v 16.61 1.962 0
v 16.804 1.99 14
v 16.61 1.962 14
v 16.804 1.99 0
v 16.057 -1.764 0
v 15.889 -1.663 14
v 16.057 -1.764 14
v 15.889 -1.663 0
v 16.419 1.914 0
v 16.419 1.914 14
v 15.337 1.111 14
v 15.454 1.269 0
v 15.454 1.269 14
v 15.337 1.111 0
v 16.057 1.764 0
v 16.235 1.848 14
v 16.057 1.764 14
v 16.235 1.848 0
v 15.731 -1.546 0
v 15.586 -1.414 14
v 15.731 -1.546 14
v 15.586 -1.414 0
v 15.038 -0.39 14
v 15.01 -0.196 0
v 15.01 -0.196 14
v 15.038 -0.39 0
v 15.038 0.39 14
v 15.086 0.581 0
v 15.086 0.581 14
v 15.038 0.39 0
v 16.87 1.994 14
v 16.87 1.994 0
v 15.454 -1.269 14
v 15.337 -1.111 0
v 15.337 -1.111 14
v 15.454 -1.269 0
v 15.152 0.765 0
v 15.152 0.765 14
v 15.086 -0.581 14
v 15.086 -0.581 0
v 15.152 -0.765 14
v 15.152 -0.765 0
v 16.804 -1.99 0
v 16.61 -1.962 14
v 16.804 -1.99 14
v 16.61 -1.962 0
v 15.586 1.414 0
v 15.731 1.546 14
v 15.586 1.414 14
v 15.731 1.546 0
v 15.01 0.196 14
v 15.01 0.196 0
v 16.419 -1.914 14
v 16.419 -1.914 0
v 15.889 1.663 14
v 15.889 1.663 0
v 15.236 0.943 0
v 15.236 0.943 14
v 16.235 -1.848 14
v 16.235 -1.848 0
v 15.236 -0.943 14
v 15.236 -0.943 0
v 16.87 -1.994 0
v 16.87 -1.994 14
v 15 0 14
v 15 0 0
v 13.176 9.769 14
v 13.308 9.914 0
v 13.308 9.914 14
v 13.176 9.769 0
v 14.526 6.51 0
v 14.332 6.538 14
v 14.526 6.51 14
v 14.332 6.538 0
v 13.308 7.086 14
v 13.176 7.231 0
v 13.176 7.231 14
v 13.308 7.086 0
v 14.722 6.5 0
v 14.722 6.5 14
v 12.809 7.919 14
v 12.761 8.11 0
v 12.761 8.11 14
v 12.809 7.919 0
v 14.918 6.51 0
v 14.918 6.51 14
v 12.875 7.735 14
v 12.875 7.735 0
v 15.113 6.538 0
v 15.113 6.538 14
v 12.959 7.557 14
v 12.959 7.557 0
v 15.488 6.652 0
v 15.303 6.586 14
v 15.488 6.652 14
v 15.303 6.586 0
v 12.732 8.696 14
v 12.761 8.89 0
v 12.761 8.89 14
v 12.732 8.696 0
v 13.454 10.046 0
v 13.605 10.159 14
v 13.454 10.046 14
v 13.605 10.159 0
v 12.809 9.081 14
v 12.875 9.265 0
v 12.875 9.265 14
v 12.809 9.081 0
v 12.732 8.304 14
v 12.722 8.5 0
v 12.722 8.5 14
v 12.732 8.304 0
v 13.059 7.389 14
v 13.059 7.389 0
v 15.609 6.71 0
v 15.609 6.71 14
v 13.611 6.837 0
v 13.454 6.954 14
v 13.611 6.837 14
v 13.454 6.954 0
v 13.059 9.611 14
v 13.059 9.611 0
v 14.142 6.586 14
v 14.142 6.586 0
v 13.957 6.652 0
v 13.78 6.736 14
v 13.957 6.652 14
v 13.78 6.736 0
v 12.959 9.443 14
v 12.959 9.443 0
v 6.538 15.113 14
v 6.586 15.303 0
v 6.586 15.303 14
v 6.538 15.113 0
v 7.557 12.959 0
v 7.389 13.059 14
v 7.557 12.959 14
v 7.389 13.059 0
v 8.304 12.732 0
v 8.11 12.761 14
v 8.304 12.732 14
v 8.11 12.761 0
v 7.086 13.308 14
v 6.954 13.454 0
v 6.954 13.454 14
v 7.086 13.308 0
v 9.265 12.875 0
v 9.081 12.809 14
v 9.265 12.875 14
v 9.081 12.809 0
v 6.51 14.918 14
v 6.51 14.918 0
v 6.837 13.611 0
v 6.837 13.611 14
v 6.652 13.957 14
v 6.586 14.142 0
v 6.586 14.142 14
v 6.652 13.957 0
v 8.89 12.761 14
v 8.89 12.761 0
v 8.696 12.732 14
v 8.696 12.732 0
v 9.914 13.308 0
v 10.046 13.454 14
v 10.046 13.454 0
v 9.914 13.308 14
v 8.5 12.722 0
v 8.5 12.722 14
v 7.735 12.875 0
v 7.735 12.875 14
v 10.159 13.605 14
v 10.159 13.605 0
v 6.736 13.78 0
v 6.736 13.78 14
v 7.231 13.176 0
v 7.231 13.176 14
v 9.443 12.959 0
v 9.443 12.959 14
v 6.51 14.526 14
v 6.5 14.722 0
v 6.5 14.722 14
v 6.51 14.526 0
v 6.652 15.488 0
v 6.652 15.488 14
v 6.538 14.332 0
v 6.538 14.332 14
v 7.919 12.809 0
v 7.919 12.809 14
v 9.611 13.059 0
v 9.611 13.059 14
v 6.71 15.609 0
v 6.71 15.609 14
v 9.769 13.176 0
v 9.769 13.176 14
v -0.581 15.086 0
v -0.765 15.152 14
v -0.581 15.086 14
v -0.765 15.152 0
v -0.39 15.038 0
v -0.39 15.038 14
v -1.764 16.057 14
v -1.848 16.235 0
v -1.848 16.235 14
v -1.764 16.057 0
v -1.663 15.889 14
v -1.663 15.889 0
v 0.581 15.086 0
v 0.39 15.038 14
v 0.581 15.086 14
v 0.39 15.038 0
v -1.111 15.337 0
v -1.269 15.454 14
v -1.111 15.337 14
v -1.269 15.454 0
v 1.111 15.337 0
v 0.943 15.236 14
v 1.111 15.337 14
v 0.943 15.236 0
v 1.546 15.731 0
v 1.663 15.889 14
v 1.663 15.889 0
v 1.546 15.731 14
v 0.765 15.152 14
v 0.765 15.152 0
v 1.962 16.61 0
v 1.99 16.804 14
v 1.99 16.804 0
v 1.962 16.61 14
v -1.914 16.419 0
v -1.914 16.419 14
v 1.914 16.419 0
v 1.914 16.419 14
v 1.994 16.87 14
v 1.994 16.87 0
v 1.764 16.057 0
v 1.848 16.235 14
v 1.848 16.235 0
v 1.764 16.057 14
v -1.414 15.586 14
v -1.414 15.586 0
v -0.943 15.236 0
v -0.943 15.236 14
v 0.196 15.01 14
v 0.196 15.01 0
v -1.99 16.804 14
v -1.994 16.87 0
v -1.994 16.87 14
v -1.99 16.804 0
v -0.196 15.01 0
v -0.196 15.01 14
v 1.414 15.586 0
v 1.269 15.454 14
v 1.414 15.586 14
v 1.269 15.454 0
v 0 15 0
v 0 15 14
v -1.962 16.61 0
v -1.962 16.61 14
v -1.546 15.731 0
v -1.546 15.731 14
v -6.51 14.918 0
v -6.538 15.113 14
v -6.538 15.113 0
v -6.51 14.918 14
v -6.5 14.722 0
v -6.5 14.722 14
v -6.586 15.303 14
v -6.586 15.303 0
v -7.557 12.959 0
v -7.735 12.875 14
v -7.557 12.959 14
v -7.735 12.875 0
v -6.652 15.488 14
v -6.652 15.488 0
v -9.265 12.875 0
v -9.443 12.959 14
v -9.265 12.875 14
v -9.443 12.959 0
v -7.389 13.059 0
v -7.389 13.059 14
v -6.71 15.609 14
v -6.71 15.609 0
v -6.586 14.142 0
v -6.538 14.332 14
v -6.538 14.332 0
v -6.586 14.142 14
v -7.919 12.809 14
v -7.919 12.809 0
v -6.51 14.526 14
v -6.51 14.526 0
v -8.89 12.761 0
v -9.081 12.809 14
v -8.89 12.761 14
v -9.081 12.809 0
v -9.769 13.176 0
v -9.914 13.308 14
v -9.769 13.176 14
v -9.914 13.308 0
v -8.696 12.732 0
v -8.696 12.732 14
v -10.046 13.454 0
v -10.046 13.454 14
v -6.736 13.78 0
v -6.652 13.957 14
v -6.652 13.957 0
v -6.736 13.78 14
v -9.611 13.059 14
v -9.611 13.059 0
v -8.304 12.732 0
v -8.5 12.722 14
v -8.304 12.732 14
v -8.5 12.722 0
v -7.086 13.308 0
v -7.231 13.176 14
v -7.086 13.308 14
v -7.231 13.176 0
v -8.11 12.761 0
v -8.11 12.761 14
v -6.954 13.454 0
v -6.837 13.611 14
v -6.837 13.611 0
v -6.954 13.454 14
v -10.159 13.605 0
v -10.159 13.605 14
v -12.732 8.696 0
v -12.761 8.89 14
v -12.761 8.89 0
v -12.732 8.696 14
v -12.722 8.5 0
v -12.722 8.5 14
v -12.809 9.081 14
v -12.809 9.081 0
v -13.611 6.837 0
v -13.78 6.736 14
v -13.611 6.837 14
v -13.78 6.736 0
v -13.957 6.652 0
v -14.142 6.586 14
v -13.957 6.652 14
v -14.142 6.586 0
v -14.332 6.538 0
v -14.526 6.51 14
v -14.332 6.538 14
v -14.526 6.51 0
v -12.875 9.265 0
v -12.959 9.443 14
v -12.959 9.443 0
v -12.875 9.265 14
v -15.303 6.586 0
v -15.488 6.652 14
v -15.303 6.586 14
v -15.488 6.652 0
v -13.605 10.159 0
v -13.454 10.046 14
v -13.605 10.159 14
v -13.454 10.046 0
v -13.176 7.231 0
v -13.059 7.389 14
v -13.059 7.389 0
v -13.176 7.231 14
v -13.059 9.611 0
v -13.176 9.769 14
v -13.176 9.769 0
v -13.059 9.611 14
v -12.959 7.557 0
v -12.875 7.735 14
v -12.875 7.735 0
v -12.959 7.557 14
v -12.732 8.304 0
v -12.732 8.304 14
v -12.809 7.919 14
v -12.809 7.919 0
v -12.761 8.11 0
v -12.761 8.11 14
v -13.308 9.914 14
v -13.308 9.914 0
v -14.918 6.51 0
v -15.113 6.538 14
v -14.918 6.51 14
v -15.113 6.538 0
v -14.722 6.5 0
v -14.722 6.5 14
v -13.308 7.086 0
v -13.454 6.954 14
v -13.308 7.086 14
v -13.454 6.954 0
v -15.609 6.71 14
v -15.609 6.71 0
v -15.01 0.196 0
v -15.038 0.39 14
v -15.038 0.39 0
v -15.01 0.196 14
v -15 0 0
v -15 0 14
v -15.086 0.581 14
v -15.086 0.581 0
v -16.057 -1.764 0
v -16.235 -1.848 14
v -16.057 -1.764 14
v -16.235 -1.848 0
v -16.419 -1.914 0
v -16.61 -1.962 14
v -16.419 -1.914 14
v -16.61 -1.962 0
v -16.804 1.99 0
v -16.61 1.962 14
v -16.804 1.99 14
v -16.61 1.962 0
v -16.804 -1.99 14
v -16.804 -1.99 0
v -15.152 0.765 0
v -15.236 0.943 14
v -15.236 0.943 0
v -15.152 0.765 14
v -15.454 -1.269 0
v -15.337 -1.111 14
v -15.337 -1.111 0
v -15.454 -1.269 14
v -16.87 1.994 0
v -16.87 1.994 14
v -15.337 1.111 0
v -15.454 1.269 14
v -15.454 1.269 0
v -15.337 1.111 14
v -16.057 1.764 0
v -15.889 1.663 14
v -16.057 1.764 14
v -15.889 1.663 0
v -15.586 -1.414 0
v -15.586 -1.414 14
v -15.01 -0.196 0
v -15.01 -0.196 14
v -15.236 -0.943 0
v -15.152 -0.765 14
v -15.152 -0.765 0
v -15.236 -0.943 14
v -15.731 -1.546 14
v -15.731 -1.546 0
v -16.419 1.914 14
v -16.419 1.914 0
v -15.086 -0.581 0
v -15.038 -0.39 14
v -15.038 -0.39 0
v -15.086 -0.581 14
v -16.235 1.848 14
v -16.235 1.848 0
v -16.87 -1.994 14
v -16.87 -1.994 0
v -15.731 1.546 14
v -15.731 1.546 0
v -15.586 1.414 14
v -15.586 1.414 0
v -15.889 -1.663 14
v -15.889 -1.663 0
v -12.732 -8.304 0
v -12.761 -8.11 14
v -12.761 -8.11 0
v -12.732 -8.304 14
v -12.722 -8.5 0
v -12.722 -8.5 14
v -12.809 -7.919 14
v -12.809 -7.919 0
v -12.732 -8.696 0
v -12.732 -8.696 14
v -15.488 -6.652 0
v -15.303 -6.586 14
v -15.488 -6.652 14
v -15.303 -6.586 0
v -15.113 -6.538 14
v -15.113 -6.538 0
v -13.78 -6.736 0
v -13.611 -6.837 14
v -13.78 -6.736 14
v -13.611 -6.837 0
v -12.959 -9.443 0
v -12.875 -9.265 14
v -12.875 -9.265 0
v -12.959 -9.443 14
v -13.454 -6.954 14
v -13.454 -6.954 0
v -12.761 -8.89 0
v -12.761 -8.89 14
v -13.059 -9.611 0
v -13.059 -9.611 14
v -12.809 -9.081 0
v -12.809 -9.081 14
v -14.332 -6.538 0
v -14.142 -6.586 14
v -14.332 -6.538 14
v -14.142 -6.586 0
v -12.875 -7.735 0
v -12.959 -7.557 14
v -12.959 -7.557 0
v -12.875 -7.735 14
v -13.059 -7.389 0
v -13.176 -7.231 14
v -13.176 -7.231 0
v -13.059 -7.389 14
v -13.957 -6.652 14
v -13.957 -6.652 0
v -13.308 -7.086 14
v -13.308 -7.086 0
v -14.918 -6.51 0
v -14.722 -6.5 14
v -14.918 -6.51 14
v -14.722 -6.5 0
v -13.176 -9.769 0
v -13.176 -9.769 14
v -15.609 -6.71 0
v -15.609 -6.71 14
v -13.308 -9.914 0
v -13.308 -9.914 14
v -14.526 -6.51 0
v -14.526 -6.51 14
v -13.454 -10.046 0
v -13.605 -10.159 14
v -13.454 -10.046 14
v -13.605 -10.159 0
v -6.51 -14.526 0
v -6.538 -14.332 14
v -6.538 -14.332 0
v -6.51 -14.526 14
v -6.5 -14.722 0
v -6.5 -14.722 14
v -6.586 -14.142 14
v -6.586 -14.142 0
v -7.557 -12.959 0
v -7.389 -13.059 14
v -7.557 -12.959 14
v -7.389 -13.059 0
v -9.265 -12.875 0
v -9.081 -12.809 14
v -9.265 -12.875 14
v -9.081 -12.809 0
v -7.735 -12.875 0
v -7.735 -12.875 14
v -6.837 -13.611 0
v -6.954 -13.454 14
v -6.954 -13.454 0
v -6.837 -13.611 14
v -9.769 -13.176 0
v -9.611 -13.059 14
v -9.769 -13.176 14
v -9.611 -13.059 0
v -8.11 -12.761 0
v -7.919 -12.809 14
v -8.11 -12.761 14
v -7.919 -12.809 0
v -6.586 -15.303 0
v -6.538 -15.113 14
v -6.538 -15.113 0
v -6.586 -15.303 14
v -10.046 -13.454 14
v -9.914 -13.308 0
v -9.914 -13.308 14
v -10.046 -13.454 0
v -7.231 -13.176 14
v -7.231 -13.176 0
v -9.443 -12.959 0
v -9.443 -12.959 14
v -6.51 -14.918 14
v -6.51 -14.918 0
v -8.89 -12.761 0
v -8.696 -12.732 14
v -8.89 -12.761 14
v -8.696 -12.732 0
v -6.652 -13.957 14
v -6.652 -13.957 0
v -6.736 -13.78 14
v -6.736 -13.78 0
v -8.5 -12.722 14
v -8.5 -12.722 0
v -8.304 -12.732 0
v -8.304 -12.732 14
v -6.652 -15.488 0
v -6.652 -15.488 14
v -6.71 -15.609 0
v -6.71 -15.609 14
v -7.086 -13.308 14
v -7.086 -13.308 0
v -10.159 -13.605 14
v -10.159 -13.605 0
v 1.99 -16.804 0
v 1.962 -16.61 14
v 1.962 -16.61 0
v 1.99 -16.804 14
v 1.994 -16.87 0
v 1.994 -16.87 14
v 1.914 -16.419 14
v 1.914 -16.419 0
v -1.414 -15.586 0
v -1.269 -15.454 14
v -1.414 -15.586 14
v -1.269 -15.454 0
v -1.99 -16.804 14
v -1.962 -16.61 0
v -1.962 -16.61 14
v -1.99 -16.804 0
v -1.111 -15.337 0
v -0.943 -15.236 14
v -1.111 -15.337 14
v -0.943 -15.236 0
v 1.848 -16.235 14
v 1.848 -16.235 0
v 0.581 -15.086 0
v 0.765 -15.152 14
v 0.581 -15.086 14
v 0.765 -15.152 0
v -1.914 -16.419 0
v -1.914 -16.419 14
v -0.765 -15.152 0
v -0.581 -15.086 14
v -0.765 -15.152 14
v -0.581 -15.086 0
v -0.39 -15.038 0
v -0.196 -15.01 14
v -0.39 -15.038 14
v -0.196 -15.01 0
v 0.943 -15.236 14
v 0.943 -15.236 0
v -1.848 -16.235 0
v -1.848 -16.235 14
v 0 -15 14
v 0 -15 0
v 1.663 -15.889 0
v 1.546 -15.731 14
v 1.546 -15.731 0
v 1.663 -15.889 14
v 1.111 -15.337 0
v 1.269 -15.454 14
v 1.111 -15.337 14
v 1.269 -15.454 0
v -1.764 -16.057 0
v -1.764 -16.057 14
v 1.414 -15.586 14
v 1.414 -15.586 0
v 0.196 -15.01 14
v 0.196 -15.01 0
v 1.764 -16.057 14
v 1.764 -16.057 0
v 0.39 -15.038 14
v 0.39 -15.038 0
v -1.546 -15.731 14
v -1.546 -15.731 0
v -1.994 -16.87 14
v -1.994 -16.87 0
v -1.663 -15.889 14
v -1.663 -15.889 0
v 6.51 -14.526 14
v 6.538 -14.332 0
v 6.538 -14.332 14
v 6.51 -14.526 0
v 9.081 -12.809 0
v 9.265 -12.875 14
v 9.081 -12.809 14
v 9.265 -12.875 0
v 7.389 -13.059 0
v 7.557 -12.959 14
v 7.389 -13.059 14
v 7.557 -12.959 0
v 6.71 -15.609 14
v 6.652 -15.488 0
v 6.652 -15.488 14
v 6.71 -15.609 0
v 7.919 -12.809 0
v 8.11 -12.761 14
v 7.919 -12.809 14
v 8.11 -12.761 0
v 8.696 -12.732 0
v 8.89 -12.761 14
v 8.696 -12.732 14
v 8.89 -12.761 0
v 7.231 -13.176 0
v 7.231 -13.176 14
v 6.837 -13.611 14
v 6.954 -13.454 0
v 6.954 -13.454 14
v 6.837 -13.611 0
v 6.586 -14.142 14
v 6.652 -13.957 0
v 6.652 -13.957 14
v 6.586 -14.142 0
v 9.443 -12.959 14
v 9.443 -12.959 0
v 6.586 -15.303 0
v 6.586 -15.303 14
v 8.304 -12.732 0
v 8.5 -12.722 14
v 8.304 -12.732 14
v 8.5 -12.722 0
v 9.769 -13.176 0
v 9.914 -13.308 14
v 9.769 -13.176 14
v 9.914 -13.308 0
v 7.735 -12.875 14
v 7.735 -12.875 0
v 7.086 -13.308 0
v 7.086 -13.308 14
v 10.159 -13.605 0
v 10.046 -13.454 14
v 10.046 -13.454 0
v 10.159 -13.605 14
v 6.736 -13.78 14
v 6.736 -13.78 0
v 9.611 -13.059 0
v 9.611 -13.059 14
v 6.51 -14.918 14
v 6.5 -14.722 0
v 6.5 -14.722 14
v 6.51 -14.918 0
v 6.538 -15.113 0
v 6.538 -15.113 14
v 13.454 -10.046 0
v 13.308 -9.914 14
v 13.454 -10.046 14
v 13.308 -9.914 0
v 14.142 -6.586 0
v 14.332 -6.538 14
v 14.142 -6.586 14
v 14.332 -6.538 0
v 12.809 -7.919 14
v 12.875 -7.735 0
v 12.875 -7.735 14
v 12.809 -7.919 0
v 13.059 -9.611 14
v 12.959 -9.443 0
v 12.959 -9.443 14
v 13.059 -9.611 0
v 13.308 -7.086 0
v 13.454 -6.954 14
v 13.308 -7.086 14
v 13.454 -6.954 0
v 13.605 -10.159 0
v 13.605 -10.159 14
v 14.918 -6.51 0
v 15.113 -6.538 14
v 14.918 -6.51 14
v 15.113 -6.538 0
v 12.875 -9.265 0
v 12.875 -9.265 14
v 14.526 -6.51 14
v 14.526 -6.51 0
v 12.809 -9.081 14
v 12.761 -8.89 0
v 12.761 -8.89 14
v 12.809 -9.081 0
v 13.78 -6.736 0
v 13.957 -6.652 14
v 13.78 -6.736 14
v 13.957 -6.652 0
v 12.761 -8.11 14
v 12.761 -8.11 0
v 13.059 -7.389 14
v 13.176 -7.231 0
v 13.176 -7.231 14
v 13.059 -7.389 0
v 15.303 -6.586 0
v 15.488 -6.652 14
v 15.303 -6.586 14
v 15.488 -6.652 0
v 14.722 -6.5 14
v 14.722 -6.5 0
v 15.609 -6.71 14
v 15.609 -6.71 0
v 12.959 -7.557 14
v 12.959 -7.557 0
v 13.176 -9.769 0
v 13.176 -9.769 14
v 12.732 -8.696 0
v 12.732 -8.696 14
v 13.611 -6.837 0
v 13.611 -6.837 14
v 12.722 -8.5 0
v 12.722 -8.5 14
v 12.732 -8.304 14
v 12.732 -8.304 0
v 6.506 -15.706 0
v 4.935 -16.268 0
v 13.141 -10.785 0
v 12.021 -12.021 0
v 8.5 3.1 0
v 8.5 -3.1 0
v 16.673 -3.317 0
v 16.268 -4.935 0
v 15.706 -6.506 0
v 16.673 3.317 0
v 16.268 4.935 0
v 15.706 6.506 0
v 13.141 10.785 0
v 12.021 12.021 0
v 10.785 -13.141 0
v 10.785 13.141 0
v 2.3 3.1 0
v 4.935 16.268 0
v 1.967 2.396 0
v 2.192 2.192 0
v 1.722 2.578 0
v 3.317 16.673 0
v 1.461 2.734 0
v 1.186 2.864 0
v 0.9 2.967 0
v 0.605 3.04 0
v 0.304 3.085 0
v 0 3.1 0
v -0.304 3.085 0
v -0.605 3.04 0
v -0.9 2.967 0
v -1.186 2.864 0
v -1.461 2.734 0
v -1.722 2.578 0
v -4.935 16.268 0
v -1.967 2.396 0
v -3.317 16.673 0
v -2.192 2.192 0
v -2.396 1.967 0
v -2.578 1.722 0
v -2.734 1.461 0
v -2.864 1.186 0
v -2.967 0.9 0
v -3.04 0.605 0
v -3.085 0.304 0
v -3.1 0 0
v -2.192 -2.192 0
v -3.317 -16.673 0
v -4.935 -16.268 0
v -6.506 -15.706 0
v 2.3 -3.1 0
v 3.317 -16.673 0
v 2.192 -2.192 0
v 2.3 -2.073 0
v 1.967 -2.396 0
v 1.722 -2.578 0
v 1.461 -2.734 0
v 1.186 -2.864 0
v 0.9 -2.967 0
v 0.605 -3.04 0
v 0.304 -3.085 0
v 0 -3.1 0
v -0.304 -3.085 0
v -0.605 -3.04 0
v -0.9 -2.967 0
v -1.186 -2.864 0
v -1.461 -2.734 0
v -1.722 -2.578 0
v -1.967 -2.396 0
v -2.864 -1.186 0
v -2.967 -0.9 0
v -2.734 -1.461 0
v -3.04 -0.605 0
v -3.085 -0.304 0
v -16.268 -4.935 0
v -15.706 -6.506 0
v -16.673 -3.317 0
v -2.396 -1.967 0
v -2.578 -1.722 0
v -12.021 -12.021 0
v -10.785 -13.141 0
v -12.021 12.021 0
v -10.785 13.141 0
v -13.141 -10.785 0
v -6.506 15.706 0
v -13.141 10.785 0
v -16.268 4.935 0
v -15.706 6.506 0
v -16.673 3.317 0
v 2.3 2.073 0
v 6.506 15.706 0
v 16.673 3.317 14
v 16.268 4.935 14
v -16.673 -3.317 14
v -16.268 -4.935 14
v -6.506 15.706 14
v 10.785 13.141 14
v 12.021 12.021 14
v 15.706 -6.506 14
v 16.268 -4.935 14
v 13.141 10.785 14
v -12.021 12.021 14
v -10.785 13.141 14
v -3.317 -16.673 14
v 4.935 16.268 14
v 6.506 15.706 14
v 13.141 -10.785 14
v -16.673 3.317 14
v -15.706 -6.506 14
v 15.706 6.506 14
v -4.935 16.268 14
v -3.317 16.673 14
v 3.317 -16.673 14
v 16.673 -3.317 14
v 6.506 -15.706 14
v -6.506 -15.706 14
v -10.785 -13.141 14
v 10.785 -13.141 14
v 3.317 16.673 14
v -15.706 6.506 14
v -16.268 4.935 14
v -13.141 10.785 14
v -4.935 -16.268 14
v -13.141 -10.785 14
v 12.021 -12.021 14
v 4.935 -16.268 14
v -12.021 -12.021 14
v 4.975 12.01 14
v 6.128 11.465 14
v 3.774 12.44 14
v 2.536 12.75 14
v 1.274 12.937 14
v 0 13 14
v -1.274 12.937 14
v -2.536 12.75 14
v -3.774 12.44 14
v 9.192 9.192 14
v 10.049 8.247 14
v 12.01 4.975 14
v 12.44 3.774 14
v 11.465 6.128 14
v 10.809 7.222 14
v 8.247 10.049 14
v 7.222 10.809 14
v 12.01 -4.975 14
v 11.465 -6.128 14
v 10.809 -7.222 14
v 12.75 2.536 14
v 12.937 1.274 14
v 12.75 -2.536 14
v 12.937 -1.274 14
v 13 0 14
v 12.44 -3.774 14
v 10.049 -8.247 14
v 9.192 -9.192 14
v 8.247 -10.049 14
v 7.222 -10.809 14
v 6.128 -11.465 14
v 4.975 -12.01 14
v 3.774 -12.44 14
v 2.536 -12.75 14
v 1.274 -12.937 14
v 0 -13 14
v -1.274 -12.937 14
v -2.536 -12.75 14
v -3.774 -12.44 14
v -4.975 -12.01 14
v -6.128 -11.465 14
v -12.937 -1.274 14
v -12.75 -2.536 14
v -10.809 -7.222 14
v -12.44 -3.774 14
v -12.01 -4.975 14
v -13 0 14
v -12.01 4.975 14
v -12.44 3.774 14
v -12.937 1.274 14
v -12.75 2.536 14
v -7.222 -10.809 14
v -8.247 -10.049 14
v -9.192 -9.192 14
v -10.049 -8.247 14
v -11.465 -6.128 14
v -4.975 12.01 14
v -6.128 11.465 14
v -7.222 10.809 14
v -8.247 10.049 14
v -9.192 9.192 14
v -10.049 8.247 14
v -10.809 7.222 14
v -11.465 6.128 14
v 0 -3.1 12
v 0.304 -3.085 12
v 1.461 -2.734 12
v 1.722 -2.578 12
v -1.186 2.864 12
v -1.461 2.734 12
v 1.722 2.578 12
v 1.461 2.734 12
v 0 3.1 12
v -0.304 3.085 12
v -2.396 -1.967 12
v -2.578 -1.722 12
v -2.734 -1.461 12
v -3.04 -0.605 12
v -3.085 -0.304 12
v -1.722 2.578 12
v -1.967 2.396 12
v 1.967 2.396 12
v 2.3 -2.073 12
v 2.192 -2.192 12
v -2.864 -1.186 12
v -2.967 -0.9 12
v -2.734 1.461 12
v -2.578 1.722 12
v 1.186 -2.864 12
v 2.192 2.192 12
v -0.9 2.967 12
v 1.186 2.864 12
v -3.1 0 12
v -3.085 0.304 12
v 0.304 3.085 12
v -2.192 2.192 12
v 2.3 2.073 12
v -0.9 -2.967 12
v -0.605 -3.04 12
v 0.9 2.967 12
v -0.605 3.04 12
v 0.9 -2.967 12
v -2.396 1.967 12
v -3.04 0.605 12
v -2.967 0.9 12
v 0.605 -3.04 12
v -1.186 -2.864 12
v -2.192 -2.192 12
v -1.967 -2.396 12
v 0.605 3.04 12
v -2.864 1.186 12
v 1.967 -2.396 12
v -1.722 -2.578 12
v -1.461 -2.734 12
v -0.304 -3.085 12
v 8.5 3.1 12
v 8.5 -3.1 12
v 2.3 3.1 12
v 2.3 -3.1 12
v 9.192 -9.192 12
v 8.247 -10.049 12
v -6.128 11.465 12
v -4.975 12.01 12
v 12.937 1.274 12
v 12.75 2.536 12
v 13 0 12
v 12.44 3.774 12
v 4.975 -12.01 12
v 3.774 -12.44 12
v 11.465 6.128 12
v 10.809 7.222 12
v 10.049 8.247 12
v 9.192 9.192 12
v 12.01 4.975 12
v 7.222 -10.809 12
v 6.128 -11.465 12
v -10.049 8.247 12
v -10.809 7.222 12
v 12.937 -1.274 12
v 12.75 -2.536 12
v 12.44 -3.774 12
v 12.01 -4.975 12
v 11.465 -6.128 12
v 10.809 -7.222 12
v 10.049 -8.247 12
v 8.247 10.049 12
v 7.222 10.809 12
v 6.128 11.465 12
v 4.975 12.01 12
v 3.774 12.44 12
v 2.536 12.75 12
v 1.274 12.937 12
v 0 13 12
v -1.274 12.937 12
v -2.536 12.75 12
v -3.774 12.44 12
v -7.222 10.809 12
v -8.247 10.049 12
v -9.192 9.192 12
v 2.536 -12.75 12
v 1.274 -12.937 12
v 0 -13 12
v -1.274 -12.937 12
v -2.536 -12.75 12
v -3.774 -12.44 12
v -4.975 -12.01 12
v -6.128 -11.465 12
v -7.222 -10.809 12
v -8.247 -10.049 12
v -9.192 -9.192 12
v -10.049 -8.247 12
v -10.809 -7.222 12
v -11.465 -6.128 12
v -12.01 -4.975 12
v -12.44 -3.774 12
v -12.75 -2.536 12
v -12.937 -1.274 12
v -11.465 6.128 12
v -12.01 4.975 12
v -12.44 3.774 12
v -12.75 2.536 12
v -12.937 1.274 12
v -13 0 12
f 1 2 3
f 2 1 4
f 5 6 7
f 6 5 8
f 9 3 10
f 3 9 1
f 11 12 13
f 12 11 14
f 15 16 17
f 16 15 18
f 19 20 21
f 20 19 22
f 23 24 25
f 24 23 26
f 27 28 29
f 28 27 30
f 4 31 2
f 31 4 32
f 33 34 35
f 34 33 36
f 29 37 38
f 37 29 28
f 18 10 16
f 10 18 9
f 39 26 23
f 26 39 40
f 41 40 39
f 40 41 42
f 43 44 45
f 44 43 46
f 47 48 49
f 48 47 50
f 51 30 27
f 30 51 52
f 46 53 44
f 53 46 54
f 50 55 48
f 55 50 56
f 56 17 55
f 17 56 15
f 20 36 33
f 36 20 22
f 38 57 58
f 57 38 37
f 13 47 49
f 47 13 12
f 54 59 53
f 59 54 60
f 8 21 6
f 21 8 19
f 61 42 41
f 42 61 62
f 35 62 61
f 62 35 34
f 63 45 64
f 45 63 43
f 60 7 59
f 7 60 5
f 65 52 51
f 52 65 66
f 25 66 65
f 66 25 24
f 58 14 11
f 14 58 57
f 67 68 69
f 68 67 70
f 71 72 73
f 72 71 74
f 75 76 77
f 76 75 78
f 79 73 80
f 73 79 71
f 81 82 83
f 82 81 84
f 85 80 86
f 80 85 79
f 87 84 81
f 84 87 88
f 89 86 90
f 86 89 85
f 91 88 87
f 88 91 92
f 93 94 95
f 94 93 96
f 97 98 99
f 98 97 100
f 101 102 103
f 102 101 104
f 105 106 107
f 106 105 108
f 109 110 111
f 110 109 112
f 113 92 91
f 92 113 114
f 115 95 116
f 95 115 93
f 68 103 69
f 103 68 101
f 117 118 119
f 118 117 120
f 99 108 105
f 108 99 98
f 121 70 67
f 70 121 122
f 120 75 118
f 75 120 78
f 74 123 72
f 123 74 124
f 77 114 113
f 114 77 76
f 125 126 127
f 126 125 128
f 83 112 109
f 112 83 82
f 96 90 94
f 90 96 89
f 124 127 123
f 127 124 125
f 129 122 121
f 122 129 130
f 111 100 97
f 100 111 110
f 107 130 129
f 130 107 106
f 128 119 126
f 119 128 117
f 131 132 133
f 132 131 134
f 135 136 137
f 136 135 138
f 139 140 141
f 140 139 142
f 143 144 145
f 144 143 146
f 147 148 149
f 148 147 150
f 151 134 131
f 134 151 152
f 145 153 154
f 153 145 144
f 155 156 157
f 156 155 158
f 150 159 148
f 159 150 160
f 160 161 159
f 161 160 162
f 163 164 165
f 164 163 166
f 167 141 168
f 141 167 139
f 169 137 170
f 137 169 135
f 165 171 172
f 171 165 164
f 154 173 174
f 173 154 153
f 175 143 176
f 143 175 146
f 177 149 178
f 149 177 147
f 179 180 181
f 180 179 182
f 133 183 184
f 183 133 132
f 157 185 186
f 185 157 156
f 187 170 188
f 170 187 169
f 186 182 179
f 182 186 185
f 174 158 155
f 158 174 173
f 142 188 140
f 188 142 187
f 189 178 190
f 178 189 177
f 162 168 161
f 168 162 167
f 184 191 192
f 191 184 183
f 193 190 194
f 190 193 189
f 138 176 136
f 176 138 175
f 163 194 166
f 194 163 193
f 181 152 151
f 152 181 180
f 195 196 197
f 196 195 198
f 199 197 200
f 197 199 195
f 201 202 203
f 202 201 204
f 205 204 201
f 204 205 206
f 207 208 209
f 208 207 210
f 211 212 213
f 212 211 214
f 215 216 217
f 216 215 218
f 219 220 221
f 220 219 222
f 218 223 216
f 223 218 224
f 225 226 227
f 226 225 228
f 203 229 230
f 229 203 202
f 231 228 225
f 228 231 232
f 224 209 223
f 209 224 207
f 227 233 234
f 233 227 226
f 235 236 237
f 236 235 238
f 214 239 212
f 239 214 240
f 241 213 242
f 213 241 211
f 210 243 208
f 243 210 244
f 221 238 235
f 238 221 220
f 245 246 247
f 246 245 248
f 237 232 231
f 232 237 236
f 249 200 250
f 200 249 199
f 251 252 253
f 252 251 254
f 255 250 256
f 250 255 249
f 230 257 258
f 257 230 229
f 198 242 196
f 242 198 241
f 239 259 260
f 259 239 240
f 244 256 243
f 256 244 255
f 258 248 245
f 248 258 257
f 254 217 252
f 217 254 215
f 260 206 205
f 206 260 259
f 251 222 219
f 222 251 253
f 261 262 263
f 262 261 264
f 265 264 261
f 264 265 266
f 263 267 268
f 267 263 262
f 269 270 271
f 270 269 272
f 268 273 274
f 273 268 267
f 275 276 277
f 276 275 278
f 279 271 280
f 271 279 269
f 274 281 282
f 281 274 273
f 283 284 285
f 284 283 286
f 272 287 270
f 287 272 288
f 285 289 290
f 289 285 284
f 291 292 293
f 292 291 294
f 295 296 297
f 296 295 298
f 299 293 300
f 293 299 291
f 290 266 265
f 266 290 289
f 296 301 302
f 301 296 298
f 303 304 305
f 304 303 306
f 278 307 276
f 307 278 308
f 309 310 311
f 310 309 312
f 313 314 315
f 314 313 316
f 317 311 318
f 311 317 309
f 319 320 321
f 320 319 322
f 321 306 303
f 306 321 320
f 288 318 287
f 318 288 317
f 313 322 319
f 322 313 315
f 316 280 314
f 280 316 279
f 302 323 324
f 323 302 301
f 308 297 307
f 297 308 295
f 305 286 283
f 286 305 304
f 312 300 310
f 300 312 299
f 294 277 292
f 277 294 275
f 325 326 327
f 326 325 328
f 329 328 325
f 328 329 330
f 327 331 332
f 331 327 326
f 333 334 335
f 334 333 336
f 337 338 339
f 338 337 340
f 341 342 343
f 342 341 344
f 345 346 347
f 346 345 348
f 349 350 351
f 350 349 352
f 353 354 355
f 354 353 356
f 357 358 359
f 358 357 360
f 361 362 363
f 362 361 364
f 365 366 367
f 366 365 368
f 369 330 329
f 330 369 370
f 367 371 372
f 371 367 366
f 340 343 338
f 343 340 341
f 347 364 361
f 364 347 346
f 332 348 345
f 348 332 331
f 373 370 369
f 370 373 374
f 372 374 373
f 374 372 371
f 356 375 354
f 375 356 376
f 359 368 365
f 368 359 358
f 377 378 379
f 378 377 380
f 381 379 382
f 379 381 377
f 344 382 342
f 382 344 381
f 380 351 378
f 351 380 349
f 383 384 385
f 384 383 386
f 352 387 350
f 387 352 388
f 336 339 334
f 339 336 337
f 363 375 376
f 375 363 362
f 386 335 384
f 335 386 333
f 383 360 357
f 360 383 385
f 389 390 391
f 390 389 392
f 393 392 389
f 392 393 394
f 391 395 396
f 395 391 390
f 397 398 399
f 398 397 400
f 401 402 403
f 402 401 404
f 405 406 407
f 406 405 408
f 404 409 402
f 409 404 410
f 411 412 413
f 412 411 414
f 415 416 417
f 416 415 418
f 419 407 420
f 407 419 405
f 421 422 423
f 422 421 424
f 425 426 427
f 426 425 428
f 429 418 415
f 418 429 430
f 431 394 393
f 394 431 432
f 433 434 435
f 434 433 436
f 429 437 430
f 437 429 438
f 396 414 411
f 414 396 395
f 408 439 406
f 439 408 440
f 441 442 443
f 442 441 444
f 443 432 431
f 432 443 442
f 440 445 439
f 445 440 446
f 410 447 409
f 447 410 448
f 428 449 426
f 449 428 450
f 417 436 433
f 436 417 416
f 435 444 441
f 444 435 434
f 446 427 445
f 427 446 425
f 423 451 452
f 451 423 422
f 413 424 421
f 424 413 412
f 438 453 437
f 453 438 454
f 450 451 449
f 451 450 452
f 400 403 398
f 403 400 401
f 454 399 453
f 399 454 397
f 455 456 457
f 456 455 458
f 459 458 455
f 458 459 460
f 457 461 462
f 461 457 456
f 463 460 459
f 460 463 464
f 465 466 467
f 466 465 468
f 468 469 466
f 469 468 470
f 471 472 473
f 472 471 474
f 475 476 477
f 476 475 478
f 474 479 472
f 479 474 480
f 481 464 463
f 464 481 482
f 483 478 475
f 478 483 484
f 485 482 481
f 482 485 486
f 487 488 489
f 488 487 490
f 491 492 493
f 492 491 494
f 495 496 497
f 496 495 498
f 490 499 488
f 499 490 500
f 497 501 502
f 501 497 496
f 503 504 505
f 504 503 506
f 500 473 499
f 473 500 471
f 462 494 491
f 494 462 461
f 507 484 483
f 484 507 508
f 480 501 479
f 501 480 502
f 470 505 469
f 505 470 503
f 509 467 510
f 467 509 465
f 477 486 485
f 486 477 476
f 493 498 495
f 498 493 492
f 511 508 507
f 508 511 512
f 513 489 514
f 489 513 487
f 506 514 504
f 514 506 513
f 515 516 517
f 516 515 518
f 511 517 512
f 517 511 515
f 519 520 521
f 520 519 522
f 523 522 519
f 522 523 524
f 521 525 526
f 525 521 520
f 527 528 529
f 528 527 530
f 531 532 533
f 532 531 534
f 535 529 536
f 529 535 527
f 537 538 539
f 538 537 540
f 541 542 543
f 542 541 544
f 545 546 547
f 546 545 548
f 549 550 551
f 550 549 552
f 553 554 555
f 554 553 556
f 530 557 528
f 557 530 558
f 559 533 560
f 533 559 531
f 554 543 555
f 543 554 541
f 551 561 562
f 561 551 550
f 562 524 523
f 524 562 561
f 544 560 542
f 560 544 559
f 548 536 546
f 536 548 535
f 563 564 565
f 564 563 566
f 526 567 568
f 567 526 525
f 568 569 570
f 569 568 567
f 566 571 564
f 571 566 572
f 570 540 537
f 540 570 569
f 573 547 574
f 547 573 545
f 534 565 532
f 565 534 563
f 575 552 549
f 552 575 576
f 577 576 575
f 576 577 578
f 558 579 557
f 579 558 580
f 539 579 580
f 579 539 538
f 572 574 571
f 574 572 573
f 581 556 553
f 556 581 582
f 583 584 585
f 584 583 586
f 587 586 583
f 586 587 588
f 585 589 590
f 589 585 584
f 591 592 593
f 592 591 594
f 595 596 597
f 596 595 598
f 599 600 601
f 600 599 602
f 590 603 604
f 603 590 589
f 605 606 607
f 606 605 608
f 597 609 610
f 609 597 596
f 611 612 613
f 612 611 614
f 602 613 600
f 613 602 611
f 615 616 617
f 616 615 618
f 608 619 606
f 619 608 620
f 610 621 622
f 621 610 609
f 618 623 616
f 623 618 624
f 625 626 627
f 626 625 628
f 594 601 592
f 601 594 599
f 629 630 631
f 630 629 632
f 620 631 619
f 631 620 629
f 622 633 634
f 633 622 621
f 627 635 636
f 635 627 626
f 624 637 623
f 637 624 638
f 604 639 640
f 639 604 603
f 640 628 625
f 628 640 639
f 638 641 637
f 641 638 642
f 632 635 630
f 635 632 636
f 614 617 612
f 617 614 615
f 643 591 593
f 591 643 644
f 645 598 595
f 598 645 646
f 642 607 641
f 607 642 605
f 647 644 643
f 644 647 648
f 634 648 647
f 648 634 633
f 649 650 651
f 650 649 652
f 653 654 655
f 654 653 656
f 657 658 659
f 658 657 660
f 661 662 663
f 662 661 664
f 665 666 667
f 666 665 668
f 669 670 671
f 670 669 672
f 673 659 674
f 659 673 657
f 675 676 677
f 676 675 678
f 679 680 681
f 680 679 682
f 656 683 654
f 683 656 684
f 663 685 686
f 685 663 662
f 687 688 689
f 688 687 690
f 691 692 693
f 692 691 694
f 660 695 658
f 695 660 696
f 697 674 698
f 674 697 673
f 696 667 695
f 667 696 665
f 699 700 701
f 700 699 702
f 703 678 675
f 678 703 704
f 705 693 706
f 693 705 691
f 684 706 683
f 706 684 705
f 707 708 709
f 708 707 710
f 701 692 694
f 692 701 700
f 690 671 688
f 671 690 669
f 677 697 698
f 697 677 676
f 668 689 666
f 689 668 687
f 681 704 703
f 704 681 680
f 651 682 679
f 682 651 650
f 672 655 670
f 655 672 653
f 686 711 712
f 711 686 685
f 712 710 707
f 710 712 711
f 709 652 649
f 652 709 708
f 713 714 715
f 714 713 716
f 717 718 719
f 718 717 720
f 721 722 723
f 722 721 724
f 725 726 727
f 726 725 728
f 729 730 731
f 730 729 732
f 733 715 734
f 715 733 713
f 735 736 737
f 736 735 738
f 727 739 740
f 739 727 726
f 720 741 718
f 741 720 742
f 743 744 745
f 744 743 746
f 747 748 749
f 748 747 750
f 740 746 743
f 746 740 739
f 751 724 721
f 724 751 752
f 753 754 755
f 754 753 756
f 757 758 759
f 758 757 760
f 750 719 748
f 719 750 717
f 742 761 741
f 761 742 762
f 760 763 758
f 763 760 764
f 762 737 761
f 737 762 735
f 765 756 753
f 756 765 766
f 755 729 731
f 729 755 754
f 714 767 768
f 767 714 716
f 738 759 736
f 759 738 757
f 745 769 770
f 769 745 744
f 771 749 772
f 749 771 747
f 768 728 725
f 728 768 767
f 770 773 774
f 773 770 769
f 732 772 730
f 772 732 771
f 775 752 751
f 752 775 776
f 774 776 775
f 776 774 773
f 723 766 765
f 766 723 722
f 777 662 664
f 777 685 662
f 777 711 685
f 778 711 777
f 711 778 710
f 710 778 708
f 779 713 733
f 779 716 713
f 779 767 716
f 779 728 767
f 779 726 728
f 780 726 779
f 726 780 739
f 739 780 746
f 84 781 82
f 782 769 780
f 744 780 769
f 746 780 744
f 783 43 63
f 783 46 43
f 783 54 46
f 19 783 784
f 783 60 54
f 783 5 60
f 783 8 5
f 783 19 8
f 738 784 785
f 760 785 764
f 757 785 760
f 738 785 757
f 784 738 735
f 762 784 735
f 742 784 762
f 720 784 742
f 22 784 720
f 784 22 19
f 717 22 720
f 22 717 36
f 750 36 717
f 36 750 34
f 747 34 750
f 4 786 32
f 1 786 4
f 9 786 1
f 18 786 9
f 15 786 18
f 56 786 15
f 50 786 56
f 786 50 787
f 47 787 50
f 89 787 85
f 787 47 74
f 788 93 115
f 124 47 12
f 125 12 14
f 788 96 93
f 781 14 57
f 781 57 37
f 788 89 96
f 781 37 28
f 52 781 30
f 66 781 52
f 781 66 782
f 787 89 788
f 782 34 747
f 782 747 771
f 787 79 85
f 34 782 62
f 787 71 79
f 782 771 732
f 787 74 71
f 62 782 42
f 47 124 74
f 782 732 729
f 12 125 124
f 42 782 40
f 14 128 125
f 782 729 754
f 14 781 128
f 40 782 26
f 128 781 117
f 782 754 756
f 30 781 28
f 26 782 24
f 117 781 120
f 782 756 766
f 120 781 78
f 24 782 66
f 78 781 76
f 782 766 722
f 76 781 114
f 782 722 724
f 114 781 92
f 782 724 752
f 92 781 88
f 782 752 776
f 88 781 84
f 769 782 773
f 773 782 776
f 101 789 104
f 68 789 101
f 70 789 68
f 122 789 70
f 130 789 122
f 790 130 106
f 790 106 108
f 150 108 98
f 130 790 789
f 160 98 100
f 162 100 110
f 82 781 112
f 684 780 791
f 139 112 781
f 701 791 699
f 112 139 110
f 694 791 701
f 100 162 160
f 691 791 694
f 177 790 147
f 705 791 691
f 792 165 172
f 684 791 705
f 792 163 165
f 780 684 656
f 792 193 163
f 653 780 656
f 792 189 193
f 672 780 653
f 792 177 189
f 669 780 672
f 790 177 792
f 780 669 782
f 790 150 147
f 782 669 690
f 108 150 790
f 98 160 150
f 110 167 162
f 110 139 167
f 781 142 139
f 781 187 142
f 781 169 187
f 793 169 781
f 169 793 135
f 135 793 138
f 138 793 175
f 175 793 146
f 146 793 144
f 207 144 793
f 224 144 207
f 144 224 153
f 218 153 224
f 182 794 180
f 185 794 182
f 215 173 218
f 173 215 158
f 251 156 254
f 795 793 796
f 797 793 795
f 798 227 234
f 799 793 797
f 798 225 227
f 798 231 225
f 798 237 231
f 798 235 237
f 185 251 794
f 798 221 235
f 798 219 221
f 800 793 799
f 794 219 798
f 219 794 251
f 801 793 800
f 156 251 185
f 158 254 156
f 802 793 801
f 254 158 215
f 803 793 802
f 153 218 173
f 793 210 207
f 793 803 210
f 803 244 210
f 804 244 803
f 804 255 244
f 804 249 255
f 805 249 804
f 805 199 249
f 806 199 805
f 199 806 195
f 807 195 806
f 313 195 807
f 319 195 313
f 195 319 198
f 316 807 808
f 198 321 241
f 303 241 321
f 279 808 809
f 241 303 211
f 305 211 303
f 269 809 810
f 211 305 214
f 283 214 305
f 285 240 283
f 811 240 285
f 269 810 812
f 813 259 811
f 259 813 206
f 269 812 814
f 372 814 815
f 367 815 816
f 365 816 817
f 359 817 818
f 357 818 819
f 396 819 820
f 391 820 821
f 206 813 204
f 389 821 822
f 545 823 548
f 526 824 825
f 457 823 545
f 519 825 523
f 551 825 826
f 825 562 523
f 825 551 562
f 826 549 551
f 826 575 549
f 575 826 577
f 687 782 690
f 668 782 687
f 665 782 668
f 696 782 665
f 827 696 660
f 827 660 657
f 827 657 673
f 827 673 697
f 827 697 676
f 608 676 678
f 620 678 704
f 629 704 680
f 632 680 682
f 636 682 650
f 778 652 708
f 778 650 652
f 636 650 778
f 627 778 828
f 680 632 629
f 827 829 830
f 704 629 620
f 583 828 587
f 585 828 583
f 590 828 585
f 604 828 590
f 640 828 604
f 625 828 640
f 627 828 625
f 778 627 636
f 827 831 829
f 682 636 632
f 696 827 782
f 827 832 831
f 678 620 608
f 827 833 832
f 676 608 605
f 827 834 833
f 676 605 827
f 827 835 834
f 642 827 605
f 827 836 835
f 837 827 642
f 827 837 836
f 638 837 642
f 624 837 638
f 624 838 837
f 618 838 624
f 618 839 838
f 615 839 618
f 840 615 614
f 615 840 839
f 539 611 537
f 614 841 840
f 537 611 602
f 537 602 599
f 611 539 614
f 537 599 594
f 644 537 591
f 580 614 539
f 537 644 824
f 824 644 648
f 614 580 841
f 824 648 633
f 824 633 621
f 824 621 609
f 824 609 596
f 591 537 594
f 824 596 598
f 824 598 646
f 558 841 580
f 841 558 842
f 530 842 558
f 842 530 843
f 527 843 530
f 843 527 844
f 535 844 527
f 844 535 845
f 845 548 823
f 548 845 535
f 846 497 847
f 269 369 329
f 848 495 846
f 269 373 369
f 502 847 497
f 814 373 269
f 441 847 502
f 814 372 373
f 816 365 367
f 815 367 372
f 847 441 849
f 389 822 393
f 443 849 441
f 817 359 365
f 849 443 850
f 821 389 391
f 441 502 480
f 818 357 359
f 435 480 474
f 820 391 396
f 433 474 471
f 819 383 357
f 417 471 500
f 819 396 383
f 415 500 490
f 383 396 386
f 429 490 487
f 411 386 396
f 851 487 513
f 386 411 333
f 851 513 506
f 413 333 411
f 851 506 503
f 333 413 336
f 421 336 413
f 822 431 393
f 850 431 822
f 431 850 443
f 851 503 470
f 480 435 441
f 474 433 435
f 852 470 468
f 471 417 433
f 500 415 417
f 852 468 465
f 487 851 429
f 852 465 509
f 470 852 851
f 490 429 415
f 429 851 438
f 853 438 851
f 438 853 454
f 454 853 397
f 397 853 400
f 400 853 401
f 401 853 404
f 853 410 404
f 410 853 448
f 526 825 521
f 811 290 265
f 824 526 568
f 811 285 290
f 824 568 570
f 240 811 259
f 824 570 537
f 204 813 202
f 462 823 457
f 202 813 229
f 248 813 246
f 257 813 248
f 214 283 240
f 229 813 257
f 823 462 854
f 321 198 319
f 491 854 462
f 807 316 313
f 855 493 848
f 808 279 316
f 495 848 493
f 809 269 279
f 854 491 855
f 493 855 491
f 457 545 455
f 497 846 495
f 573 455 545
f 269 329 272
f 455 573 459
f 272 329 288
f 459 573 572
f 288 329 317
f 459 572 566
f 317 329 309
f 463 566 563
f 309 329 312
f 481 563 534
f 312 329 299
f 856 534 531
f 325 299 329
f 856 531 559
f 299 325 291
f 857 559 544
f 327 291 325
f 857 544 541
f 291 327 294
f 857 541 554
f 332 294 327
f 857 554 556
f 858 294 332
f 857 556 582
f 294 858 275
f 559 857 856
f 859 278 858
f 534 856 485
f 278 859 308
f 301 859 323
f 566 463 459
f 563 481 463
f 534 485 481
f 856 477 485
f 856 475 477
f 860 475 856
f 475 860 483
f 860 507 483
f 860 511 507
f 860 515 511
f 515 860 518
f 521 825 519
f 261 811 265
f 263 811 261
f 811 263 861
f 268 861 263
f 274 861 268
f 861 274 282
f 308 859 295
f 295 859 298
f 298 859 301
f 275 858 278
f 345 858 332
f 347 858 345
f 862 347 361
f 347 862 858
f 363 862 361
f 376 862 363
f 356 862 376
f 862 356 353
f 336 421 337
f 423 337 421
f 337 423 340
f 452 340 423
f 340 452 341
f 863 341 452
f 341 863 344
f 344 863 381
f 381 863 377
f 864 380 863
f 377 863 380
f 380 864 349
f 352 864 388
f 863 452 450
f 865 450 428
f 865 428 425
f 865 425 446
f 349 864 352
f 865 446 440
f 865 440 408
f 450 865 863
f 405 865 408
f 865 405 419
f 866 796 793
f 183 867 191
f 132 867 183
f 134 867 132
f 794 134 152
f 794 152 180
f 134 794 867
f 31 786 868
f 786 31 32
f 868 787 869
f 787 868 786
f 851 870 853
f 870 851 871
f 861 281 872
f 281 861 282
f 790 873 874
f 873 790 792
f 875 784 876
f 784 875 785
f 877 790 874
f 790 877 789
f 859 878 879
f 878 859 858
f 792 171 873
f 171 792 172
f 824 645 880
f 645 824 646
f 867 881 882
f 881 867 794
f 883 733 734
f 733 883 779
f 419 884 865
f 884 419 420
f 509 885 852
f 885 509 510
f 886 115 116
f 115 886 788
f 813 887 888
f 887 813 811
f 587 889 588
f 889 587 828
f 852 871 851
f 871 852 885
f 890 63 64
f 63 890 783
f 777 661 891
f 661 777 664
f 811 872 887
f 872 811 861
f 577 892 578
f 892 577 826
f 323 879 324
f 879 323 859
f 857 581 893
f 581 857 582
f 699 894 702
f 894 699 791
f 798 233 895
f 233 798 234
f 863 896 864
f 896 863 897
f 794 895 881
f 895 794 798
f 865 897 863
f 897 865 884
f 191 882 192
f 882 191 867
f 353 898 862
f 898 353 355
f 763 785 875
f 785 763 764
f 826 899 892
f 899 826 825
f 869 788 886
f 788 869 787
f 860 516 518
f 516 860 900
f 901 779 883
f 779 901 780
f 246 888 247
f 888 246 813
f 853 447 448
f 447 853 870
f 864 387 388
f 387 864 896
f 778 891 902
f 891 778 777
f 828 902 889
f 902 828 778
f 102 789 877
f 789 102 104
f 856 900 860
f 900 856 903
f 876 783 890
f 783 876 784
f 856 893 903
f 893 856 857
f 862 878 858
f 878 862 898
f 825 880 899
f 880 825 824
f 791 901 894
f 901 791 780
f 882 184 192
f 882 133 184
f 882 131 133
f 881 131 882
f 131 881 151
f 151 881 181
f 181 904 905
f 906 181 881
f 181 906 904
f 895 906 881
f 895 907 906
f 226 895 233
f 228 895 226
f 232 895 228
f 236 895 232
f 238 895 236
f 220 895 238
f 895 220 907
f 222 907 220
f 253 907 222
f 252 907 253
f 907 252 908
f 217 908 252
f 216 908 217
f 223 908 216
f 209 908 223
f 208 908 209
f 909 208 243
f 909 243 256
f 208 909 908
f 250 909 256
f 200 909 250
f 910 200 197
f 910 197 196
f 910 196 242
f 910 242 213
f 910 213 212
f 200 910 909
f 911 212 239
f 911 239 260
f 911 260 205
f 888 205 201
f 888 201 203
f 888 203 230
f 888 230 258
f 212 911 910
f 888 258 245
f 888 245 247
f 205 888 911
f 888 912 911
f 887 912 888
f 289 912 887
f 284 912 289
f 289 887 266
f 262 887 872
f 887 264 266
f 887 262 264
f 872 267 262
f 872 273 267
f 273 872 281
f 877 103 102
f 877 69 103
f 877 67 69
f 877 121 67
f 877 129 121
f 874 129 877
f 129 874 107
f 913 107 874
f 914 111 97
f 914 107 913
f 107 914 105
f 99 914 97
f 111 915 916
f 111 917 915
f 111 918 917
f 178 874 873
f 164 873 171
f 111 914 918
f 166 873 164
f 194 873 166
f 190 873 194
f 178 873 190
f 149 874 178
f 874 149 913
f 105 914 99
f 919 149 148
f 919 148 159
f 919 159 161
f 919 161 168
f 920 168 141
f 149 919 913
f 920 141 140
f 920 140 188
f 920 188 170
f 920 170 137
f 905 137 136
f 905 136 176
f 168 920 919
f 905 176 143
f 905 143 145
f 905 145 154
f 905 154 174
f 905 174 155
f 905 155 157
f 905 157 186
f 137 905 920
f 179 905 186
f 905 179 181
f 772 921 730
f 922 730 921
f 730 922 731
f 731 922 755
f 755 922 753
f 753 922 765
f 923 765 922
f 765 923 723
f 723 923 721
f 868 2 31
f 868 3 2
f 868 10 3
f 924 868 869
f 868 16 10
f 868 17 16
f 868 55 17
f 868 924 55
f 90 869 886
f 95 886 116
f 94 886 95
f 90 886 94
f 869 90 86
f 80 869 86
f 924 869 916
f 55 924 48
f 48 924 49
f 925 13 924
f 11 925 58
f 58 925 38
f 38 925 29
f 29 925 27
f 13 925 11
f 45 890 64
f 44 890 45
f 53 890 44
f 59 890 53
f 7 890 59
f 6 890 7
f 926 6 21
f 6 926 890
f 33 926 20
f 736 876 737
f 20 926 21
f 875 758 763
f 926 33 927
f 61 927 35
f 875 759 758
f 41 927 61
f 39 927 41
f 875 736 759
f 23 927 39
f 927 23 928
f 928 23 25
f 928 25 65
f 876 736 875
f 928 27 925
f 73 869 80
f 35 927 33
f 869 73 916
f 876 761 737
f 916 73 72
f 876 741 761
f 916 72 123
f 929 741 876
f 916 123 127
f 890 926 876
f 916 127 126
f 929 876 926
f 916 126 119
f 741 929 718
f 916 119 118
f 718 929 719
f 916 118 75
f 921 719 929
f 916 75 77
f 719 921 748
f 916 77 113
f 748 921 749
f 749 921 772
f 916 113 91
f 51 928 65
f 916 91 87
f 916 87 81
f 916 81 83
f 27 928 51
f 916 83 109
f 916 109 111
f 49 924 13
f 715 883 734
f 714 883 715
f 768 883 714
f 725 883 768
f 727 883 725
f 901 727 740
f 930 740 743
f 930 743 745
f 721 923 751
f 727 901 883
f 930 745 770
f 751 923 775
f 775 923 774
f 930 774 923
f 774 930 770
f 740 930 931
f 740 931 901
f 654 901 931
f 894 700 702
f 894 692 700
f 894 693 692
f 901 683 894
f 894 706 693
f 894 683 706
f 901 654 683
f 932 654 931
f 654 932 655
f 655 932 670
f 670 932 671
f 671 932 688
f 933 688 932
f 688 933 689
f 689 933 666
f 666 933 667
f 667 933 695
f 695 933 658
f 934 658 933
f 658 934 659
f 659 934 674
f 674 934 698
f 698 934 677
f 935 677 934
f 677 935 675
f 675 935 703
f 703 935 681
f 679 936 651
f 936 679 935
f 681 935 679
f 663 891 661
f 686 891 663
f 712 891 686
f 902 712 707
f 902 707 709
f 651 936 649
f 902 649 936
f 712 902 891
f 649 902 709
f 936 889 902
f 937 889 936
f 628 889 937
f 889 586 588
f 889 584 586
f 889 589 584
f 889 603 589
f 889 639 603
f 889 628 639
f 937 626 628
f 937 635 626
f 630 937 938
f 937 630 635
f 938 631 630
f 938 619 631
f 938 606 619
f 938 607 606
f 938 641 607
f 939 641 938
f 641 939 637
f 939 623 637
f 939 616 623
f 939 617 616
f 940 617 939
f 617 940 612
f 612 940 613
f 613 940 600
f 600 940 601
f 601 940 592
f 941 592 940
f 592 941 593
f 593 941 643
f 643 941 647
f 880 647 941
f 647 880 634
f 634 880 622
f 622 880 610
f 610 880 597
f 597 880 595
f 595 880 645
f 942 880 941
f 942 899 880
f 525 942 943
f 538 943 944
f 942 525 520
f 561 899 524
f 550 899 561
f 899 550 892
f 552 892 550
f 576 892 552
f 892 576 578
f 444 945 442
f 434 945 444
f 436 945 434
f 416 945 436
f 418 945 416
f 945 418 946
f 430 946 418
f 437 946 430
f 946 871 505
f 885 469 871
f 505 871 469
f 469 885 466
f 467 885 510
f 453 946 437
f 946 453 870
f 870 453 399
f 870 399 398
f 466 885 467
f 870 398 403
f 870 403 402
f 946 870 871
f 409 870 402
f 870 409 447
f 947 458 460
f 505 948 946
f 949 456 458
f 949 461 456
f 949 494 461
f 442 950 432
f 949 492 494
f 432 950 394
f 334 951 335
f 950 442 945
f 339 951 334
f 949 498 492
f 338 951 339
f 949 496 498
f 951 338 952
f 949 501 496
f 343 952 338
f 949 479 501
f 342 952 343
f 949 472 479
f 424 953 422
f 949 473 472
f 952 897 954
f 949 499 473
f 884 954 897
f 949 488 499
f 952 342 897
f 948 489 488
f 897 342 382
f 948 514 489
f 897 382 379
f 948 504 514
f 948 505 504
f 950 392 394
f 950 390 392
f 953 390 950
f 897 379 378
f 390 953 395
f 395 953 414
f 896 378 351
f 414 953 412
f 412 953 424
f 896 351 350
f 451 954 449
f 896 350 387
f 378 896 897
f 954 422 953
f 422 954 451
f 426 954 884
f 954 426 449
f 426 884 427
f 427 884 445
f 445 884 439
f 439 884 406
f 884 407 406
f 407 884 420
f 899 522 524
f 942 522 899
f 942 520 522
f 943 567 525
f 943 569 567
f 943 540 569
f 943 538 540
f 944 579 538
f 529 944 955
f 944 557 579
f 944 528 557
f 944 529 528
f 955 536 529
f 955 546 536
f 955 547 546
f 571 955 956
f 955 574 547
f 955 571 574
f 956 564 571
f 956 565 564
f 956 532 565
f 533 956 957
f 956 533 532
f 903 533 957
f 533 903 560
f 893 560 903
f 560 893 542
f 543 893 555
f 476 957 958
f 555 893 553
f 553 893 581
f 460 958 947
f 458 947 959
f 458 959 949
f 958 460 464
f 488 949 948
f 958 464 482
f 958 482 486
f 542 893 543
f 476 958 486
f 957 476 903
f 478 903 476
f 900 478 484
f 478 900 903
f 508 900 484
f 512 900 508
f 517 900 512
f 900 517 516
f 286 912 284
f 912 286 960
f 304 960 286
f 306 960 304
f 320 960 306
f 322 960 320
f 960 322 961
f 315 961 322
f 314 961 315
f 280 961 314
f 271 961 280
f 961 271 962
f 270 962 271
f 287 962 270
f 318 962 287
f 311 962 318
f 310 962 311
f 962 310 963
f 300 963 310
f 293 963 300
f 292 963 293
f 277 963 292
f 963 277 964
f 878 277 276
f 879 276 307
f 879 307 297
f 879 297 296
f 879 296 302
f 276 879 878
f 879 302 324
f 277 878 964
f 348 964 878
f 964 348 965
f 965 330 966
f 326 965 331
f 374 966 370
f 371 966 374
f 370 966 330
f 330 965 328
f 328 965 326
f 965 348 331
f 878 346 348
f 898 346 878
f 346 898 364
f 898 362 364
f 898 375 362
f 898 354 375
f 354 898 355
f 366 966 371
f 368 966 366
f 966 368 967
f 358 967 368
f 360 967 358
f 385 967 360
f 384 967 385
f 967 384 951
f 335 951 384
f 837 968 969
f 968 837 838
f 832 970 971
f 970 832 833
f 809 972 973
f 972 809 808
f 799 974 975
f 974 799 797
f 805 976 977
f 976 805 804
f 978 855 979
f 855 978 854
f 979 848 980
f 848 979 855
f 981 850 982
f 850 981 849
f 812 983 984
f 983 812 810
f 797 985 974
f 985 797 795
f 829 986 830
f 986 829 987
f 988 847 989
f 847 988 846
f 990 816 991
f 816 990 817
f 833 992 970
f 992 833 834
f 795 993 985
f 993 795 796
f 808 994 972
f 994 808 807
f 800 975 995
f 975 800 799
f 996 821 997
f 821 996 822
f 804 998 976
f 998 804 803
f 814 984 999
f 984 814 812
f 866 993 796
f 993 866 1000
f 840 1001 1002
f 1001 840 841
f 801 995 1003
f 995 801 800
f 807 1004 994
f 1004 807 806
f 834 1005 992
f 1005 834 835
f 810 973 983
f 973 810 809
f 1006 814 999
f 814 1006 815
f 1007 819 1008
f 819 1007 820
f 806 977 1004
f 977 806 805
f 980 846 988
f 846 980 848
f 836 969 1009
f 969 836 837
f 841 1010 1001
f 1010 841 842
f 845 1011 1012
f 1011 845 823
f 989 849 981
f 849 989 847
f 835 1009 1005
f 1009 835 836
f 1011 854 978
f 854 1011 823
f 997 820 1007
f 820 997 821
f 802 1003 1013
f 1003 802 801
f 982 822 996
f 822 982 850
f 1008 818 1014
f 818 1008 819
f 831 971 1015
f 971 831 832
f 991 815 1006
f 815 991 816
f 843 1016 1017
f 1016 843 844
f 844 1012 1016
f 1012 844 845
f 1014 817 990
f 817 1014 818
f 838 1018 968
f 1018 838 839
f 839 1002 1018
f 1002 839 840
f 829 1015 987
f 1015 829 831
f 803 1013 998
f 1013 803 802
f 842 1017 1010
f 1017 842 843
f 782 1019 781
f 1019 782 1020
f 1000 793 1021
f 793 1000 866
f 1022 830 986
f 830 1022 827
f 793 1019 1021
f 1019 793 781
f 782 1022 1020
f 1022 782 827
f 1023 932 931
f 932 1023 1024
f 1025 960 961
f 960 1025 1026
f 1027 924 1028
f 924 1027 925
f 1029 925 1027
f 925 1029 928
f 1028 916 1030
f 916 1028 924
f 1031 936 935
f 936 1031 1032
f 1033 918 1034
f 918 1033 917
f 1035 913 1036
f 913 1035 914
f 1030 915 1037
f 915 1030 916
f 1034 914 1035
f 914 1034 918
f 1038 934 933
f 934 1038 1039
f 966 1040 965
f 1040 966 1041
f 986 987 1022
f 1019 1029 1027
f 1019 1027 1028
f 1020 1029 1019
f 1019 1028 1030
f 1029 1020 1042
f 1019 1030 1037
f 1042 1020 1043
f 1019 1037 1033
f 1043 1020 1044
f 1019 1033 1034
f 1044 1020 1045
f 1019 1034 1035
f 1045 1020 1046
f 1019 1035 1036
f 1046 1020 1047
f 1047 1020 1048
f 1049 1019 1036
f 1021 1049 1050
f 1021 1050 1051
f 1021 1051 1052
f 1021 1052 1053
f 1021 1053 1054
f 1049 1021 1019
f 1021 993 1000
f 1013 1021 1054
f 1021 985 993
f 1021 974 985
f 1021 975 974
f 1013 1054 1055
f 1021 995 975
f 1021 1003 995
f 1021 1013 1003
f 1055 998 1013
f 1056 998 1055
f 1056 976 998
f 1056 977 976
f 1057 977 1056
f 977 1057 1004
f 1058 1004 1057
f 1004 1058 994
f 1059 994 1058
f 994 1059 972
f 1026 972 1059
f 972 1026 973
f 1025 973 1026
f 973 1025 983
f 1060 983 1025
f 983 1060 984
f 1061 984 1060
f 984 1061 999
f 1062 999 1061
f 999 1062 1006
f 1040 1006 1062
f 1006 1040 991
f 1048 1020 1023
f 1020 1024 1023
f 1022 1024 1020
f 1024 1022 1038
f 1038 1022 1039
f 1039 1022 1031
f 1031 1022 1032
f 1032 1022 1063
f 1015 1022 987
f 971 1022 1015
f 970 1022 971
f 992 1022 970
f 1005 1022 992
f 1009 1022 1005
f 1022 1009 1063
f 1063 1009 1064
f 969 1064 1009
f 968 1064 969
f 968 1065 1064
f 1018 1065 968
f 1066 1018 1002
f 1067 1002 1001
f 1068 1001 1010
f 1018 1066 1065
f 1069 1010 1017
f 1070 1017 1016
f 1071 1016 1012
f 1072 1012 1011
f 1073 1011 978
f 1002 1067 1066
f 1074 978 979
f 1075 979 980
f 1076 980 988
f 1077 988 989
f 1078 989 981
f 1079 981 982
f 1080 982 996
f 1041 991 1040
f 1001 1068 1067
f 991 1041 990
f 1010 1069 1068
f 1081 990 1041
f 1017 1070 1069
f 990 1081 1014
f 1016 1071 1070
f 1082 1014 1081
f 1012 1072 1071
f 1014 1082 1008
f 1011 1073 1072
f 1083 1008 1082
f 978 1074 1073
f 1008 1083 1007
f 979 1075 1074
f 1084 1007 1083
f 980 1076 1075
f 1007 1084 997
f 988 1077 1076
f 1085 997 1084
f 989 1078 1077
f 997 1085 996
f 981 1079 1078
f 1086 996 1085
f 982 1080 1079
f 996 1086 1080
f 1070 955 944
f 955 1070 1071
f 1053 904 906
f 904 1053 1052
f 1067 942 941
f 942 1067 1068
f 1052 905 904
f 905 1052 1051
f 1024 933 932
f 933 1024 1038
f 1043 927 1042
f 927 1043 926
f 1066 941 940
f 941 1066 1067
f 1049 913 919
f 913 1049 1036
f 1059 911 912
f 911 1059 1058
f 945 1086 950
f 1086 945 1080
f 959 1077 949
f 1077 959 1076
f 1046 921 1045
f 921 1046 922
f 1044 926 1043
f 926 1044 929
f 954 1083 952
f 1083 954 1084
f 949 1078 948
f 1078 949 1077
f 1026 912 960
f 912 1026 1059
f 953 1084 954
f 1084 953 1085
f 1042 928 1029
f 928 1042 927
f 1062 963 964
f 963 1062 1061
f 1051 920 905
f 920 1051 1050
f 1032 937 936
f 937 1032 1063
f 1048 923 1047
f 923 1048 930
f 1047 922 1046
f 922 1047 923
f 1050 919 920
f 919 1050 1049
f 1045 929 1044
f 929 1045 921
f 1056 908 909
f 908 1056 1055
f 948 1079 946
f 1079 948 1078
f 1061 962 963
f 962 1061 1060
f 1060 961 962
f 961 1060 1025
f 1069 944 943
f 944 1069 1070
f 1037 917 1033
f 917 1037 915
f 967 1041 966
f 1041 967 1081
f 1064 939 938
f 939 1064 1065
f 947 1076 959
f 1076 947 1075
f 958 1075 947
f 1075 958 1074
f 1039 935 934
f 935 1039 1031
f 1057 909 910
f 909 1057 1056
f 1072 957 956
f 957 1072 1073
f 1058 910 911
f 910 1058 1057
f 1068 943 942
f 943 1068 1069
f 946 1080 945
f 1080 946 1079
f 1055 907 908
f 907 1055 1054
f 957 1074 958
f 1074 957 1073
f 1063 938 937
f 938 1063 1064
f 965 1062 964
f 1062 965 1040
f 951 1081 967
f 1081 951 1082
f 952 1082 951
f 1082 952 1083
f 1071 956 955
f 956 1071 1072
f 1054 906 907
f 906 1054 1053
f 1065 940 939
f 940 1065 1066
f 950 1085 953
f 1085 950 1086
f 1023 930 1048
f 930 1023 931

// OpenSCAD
// Plain OpenSCAD — build it directly:  brepscript knob.scad -o knob.stl
// A knurled-ish knob: a disc with grip cuts around the rim and a D-shaft bore.

$fn = 64;

knob_d   = 34;
knob_h   = 14;
shaft_d  = 6.2;
grips    = 12;
grip_d   = 4;

module grip_ring(count, ring_r, cut_d, h) {
  for (i = [0 : count - 1]) {
    angle = i * 360 / count;
    translate([ring_r * cos(angle), ring_r * sin(angle), -1])
      cylinder(h = h + 2, d = cut_d);
  }
}

difference() {
  cylinder(h = knob_h, d = knob_d);

  // grip cuts around the outside
  grip_ring(grips, knob_d / 2, grip_d, knob_h);

  // D-shaped shaft bore
  translate([0, 0, -1]) cylinder(h = knob_h + 2, d = shaft_d);
  translate([shaft_d / 2 - 0.8, -shaft_d / 2, -1])
    cube([shaft_d, shaft_d, knob_h + 2]);

  // recessed top
  translate([0, 0, knob_h - 2]) cylinder(h = 3, d = knob_d - 8);
}
